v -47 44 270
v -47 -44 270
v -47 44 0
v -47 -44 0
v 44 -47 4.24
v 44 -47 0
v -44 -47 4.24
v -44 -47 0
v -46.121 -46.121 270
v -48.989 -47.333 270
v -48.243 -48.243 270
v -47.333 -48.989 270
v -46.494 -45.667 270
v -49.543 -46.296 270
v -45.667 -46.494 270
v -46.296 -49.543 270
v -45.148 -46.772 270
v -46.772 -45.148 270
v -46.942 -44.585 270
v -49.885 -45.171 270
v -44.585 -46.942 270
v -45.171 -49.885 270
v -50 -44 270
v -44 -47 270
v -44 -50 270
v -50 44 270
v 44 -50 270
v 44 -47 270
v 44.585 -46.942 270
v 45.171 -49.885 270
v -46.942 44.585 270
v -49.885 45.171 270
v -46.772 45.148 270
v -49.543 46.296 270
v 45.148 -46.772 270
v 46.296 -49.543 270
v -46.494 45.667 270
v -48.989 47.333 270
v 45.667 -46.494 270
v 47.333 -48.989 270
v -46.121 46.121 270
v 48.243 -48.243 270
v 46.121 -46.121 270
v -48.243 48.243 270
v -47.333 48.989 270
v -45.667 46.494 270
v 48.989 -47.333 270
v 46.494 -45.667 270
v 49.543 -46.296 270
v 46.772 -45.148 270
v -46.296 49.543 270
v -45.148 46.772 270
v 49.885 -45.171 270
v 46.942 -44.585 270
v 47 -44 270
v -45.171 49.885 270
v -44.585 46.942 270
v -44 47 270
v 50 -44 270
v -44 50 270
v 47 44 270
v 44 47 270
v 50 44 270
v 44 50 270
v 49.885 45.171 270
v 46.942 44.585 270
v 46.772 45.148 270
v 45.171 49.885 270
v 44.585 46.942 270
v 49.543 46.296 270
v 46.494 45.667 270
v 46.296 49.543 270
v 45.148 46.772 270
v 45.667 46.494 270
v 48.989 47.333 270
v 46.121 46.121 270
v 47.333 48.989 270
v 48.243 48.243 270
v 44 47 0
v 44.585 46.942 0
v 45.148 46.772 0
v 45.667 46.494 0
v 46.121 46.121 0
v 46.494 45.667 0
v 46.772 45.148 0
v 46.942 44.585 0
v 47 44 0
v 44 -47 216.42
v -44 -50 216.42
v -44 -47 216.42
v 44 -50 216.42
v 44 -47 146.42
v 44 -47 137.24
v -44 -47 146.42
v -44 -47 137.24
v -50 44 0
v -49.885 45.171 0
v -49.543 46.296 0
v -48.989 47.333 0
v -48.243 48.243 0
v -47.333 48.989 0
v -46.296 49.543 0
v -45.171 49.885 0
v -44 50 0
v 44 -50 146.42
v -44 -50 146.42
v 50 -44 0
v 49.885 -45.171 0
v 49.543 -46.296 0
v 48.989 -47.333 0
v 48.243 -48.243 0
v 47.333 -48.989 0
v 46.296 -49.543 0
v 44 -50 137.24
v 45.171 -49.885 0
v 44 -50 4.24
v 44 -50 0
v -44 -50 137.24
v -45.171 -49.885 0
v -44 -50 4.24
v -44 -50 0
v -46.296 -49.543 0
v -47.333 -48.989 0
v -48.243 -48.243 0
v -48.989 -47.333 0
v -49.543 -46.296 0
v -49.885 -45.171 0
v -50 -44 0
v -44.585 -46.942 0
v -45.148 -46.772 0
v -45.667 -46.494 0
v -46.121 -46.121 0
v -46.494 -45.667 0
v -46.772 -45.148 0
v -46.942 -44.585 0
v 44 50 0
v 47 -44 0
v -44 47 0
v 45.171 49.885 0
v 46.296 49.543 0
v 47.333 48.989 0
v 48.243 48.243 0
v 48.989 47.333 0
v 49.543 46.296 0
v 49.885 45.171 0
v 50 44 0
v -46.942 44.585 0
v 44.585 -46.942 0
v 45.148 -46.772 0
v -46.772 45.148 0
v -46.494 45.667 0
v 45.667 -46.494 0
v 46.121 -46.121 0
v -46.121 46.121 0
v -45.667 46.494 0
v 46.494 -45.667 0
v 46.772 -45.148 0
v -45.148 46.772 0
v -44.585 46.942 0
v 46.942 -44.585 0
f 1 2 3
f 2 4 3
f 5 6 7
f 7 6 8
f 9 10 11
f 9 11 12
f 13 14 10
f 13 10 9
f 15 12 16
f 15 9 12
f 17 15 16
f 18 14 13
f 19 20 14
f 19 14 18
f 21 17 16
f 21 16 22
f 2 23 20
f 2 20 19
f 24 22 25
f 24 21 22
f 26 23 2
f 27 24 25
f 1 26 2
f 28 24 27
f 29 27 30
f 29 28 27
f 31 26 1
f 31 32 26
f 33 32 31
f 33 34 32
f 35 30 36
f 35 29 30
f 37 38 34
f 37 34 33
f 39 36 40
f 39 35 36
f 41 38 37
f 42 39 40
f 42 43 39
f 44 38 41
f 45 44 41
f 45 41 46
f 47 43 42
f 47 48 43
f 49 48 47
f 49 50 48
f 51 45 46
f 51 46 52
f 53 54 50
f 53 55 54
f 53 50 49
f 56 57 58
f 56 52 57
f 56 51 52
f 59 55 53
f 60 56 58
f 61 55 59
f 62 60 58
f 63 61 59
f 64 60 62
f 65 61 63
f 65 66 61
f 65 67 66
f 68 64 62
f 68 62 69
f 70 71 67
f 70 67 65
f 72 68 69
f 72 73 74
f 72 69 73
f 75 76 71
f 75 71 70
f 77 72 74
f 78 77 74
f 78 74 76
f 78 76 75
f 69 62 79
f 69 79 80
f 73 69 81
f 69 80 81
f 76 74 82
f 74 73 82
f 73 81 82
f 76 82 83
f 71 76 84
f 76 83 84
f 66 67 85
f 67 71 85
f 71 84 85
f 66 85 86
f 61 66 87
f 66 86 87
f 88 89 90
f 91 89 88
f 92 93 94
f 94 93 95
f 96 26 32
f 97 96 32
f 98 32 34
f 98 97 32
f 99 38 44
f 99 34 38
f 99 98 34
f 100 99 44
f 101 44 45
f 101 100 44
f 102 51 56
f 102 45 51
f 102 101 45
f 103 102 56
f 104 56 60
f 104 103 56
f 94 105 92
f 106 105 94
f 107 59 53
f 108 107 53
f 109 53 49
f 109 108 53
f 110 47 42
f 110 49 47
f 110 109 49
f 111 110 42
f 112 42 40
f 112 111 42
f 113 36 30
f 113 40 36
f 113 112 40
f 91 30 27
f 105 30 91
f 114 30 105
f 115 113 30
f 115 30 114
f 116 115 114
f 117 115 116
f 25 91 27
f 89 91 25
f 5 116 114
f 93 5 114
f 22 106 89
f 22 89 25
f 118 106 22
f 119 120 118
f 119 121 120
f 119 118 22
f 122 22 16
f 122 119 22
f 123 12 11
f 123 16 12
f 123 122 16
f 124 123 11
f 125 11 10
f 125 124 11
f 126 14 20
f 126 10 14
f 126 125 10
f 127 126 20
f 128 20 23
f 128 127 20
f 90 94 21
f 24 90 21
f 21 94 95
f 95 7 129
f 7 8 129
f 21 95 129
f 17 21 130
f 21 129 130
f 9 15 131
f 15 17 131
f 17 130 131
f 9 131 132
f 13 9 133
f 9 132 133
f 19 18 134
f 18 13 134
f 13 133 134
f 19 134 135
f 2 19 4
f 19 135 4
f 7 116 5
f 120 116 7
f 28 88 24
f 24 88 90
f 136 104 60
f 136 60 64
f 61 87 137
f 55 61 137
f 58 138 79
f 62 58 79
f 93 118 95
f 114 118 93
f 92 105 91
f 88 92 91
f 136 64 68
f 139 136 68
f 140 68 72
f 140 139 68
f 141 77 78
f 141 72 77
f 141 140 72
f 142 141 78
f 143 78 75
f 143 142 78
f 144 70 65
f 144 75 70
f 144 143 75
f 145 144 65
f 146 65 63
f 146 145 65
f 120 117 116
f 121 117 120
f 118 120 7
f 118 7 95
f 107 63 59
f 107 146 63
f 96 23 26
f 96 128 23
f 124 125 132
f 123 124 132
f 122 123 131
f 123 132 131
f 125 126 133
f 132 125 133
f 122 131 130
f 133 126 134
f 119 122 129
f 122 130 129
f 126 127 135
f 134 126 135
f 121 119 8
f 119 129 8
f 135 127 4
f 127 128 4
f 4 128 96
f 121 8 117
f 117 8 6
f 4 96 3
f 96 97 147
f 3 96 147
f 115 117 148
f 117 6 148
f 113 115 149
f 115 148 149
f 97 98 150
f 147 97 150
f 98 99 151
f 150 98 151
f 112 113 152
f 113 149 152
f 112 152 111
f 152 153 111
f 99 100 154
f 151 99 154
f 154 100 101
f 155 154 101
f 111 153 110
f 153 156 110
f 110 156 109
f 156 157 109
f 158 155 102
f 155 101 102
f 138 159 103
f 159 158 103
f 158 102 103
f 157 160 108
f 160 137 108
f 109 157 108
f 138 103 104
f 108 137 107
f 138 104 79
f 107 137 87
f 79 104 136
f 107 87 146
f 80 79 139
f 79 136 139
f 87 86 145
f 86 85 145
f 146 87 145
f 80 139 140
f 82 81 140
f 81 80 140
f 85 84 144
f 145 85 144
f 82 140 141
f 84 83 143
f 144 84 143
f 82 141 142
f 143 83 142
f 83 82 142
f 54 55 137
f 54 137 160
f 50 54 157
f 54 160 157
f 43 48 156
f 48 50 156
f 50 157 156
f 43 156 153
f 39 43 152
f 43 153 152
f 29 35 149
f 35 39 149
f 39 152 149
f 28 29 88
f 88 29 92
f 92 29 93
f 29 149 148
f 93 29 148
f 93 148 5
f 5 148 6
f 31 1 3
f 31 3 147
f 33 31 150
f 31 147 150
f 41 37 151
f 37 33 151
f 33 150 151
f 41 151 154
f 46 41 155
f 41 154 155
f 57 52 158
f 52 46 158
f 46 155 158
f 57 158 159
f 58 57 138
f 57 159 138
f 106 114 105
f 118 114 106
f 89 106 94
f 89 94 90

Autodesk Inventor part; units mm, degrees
ref_plane "YZ Plane" through (0, 0, 0) normal (1, 0, 0) x (0, 1, 0)
ref_plane "Start Plane" through (0, 0, 0) normal (0, 0, 1) x (1, 0, 0)
ref_plane "End Plane" through (0, 0, 270) normal (0, 0, 1) x (1, 0, 0)
sketch "Sketch" plane through (0, 0, 0) normal (0, 0, 1) x (1, 0, 0)
  line L0 (-50, -44) -> (-50, 44)
  line L1 (-44, 50) -> (44, 50)
  line L2 (50, 44) -> (50, -44)
  line L3 (44, -50) -> (-44, -50)
  arc A0 (-50, -44) -> (-44, -50) centre (-44, -44) ccw
  arc A1 (50, 44) -> (44, 50) centre (44, 44) ccw
  arc A2 (-44, 50) -> (-50, 44) centre (-44, 44) ccw
  arc A3 (44, -50) -> (50, -44) centre (44, -44) ccw
  arc A4 (-44, 47) -> (-47, 44) centre (-44, 44) ccw
  line L4 (-44, 47) -> (44, 47)
  arc A5 (47, 44) -> (44, 47) centre (44, 44) ccw
  line L5 (47, 44) -> (47, -44)
  arc A6 (44, -47) -> (47, -44) centre (44, -44) ccw
  line L6 (44, -47) -> (-44, -47)
  arc A7 (-47, -44) -> (-44, -47) centre (-44, -44) ccw
  line L7 (-47, -44) -> (-47, 44)
  line L8 (0, 71.7397) -> (0, -71.7397) construction
  line L9 (-71.7397, 0) -> (71.7397, 0) construction
  dimension "d7" = 6
  dimension "d9" = 100
  dimension "d11" = 100
  dimension "d12" = 3
  dimension "d15" = 50
  dimension "d16" = 50
extrude "Body" add sketch "Sketch" along normal up to surface (270 mm away) from surface at 0
sketch "Sketch3" plane through (0, 0, 0) normal (0, 0, 1) x (1, 0, 0)
  line L0 (0, 0) -> (10, 0)
ref_plane "Work Plane3" through (0, 0, 0) normal (0, -1, 0) x (1, 0, 0)
sketch "Sketch5" plane through (44, 50, 270) normal (0, 1, 0) x (1, 0, 0)
  point P0 (-44, 270)
sketch "Sketch6" plane through (-44, -50, 0) normal (0, -1, 0) x (1, 0, 0)
  line L0 (88, 0) -> (88, 270) projected
  line L1 (0, 0) -> (0, 270) projected
  line L2 (88, 0) -> (0, 0)
  line L3 (0, 0) -> (0, 141.42)
  line L4 (0, 141.42) -> (88, 141.42)
  line L5 (88, 141.42) -> (88, 0)
  line L6 (88, 4.24) -> (0, 4.24)
  line L7 (0, 4.24) -> (0, 137.24)
  line L8 (0, 137.24) -> (88, 137.24)
  line L9 (88, 137.24) -> (88, 4.24)
  line L10 (88, 146.42) -> (0, 146.42)
  line L11 (0, 146.42) -> (0, 216.42)
  line L12 (0, 216.42) -> (88, 216.42)
  line L13 (88, 216.42) -> (88, 146.42)
  point P0 (44, 0)
  point P1 (44, 141.42)
  point P2 (0, 146.42)
  point P3 (0, 4.24)
  dimension "d19" = 4.24
  dimension "d20" = 141.42
  dimension "d21" = 133
  dimension "d22" = 70
  dimension "d23" = 5
extrude "Extrusion2" cut sketch "Sketch6" against normal blind 3 contours L6 L1 L8 L0 | L10 L1 L12 L0
sketch "Sketch4" plane through (0, 0, 0) normal (0, -1, 0) x (1, 0, 0)
  line L0 (-2, 0) -> (12, 0) projected
  line L1 (-2, 270) -> (12, 270) projected
  dimension "d18" = 270
equation "\"d7\" = G_IR"
equation "\"d9\" = G_W"
equation "\"d11\" = G_H"
equation "\"d12\" = G_T"
equation "\"d15\" = 0.5 * d9"
equation "\"d16\" = 0.5 * d11"
equation "\"d3\" = G_L"
equation "\"G_W\" = 100"
equation "\"G_H\" = 100"
equation "\"G_T\" = 3"
equation "\"G_IR\" = 6"
equation "\"G_L\" = d18"
equation "\"G_OFFSET_START\" = 0"
equation "\"G_OFFSET_END\" = 0"
properties part number "ISO 10799-2 - 100x100x3 - 270" material "Steel, Mild"
